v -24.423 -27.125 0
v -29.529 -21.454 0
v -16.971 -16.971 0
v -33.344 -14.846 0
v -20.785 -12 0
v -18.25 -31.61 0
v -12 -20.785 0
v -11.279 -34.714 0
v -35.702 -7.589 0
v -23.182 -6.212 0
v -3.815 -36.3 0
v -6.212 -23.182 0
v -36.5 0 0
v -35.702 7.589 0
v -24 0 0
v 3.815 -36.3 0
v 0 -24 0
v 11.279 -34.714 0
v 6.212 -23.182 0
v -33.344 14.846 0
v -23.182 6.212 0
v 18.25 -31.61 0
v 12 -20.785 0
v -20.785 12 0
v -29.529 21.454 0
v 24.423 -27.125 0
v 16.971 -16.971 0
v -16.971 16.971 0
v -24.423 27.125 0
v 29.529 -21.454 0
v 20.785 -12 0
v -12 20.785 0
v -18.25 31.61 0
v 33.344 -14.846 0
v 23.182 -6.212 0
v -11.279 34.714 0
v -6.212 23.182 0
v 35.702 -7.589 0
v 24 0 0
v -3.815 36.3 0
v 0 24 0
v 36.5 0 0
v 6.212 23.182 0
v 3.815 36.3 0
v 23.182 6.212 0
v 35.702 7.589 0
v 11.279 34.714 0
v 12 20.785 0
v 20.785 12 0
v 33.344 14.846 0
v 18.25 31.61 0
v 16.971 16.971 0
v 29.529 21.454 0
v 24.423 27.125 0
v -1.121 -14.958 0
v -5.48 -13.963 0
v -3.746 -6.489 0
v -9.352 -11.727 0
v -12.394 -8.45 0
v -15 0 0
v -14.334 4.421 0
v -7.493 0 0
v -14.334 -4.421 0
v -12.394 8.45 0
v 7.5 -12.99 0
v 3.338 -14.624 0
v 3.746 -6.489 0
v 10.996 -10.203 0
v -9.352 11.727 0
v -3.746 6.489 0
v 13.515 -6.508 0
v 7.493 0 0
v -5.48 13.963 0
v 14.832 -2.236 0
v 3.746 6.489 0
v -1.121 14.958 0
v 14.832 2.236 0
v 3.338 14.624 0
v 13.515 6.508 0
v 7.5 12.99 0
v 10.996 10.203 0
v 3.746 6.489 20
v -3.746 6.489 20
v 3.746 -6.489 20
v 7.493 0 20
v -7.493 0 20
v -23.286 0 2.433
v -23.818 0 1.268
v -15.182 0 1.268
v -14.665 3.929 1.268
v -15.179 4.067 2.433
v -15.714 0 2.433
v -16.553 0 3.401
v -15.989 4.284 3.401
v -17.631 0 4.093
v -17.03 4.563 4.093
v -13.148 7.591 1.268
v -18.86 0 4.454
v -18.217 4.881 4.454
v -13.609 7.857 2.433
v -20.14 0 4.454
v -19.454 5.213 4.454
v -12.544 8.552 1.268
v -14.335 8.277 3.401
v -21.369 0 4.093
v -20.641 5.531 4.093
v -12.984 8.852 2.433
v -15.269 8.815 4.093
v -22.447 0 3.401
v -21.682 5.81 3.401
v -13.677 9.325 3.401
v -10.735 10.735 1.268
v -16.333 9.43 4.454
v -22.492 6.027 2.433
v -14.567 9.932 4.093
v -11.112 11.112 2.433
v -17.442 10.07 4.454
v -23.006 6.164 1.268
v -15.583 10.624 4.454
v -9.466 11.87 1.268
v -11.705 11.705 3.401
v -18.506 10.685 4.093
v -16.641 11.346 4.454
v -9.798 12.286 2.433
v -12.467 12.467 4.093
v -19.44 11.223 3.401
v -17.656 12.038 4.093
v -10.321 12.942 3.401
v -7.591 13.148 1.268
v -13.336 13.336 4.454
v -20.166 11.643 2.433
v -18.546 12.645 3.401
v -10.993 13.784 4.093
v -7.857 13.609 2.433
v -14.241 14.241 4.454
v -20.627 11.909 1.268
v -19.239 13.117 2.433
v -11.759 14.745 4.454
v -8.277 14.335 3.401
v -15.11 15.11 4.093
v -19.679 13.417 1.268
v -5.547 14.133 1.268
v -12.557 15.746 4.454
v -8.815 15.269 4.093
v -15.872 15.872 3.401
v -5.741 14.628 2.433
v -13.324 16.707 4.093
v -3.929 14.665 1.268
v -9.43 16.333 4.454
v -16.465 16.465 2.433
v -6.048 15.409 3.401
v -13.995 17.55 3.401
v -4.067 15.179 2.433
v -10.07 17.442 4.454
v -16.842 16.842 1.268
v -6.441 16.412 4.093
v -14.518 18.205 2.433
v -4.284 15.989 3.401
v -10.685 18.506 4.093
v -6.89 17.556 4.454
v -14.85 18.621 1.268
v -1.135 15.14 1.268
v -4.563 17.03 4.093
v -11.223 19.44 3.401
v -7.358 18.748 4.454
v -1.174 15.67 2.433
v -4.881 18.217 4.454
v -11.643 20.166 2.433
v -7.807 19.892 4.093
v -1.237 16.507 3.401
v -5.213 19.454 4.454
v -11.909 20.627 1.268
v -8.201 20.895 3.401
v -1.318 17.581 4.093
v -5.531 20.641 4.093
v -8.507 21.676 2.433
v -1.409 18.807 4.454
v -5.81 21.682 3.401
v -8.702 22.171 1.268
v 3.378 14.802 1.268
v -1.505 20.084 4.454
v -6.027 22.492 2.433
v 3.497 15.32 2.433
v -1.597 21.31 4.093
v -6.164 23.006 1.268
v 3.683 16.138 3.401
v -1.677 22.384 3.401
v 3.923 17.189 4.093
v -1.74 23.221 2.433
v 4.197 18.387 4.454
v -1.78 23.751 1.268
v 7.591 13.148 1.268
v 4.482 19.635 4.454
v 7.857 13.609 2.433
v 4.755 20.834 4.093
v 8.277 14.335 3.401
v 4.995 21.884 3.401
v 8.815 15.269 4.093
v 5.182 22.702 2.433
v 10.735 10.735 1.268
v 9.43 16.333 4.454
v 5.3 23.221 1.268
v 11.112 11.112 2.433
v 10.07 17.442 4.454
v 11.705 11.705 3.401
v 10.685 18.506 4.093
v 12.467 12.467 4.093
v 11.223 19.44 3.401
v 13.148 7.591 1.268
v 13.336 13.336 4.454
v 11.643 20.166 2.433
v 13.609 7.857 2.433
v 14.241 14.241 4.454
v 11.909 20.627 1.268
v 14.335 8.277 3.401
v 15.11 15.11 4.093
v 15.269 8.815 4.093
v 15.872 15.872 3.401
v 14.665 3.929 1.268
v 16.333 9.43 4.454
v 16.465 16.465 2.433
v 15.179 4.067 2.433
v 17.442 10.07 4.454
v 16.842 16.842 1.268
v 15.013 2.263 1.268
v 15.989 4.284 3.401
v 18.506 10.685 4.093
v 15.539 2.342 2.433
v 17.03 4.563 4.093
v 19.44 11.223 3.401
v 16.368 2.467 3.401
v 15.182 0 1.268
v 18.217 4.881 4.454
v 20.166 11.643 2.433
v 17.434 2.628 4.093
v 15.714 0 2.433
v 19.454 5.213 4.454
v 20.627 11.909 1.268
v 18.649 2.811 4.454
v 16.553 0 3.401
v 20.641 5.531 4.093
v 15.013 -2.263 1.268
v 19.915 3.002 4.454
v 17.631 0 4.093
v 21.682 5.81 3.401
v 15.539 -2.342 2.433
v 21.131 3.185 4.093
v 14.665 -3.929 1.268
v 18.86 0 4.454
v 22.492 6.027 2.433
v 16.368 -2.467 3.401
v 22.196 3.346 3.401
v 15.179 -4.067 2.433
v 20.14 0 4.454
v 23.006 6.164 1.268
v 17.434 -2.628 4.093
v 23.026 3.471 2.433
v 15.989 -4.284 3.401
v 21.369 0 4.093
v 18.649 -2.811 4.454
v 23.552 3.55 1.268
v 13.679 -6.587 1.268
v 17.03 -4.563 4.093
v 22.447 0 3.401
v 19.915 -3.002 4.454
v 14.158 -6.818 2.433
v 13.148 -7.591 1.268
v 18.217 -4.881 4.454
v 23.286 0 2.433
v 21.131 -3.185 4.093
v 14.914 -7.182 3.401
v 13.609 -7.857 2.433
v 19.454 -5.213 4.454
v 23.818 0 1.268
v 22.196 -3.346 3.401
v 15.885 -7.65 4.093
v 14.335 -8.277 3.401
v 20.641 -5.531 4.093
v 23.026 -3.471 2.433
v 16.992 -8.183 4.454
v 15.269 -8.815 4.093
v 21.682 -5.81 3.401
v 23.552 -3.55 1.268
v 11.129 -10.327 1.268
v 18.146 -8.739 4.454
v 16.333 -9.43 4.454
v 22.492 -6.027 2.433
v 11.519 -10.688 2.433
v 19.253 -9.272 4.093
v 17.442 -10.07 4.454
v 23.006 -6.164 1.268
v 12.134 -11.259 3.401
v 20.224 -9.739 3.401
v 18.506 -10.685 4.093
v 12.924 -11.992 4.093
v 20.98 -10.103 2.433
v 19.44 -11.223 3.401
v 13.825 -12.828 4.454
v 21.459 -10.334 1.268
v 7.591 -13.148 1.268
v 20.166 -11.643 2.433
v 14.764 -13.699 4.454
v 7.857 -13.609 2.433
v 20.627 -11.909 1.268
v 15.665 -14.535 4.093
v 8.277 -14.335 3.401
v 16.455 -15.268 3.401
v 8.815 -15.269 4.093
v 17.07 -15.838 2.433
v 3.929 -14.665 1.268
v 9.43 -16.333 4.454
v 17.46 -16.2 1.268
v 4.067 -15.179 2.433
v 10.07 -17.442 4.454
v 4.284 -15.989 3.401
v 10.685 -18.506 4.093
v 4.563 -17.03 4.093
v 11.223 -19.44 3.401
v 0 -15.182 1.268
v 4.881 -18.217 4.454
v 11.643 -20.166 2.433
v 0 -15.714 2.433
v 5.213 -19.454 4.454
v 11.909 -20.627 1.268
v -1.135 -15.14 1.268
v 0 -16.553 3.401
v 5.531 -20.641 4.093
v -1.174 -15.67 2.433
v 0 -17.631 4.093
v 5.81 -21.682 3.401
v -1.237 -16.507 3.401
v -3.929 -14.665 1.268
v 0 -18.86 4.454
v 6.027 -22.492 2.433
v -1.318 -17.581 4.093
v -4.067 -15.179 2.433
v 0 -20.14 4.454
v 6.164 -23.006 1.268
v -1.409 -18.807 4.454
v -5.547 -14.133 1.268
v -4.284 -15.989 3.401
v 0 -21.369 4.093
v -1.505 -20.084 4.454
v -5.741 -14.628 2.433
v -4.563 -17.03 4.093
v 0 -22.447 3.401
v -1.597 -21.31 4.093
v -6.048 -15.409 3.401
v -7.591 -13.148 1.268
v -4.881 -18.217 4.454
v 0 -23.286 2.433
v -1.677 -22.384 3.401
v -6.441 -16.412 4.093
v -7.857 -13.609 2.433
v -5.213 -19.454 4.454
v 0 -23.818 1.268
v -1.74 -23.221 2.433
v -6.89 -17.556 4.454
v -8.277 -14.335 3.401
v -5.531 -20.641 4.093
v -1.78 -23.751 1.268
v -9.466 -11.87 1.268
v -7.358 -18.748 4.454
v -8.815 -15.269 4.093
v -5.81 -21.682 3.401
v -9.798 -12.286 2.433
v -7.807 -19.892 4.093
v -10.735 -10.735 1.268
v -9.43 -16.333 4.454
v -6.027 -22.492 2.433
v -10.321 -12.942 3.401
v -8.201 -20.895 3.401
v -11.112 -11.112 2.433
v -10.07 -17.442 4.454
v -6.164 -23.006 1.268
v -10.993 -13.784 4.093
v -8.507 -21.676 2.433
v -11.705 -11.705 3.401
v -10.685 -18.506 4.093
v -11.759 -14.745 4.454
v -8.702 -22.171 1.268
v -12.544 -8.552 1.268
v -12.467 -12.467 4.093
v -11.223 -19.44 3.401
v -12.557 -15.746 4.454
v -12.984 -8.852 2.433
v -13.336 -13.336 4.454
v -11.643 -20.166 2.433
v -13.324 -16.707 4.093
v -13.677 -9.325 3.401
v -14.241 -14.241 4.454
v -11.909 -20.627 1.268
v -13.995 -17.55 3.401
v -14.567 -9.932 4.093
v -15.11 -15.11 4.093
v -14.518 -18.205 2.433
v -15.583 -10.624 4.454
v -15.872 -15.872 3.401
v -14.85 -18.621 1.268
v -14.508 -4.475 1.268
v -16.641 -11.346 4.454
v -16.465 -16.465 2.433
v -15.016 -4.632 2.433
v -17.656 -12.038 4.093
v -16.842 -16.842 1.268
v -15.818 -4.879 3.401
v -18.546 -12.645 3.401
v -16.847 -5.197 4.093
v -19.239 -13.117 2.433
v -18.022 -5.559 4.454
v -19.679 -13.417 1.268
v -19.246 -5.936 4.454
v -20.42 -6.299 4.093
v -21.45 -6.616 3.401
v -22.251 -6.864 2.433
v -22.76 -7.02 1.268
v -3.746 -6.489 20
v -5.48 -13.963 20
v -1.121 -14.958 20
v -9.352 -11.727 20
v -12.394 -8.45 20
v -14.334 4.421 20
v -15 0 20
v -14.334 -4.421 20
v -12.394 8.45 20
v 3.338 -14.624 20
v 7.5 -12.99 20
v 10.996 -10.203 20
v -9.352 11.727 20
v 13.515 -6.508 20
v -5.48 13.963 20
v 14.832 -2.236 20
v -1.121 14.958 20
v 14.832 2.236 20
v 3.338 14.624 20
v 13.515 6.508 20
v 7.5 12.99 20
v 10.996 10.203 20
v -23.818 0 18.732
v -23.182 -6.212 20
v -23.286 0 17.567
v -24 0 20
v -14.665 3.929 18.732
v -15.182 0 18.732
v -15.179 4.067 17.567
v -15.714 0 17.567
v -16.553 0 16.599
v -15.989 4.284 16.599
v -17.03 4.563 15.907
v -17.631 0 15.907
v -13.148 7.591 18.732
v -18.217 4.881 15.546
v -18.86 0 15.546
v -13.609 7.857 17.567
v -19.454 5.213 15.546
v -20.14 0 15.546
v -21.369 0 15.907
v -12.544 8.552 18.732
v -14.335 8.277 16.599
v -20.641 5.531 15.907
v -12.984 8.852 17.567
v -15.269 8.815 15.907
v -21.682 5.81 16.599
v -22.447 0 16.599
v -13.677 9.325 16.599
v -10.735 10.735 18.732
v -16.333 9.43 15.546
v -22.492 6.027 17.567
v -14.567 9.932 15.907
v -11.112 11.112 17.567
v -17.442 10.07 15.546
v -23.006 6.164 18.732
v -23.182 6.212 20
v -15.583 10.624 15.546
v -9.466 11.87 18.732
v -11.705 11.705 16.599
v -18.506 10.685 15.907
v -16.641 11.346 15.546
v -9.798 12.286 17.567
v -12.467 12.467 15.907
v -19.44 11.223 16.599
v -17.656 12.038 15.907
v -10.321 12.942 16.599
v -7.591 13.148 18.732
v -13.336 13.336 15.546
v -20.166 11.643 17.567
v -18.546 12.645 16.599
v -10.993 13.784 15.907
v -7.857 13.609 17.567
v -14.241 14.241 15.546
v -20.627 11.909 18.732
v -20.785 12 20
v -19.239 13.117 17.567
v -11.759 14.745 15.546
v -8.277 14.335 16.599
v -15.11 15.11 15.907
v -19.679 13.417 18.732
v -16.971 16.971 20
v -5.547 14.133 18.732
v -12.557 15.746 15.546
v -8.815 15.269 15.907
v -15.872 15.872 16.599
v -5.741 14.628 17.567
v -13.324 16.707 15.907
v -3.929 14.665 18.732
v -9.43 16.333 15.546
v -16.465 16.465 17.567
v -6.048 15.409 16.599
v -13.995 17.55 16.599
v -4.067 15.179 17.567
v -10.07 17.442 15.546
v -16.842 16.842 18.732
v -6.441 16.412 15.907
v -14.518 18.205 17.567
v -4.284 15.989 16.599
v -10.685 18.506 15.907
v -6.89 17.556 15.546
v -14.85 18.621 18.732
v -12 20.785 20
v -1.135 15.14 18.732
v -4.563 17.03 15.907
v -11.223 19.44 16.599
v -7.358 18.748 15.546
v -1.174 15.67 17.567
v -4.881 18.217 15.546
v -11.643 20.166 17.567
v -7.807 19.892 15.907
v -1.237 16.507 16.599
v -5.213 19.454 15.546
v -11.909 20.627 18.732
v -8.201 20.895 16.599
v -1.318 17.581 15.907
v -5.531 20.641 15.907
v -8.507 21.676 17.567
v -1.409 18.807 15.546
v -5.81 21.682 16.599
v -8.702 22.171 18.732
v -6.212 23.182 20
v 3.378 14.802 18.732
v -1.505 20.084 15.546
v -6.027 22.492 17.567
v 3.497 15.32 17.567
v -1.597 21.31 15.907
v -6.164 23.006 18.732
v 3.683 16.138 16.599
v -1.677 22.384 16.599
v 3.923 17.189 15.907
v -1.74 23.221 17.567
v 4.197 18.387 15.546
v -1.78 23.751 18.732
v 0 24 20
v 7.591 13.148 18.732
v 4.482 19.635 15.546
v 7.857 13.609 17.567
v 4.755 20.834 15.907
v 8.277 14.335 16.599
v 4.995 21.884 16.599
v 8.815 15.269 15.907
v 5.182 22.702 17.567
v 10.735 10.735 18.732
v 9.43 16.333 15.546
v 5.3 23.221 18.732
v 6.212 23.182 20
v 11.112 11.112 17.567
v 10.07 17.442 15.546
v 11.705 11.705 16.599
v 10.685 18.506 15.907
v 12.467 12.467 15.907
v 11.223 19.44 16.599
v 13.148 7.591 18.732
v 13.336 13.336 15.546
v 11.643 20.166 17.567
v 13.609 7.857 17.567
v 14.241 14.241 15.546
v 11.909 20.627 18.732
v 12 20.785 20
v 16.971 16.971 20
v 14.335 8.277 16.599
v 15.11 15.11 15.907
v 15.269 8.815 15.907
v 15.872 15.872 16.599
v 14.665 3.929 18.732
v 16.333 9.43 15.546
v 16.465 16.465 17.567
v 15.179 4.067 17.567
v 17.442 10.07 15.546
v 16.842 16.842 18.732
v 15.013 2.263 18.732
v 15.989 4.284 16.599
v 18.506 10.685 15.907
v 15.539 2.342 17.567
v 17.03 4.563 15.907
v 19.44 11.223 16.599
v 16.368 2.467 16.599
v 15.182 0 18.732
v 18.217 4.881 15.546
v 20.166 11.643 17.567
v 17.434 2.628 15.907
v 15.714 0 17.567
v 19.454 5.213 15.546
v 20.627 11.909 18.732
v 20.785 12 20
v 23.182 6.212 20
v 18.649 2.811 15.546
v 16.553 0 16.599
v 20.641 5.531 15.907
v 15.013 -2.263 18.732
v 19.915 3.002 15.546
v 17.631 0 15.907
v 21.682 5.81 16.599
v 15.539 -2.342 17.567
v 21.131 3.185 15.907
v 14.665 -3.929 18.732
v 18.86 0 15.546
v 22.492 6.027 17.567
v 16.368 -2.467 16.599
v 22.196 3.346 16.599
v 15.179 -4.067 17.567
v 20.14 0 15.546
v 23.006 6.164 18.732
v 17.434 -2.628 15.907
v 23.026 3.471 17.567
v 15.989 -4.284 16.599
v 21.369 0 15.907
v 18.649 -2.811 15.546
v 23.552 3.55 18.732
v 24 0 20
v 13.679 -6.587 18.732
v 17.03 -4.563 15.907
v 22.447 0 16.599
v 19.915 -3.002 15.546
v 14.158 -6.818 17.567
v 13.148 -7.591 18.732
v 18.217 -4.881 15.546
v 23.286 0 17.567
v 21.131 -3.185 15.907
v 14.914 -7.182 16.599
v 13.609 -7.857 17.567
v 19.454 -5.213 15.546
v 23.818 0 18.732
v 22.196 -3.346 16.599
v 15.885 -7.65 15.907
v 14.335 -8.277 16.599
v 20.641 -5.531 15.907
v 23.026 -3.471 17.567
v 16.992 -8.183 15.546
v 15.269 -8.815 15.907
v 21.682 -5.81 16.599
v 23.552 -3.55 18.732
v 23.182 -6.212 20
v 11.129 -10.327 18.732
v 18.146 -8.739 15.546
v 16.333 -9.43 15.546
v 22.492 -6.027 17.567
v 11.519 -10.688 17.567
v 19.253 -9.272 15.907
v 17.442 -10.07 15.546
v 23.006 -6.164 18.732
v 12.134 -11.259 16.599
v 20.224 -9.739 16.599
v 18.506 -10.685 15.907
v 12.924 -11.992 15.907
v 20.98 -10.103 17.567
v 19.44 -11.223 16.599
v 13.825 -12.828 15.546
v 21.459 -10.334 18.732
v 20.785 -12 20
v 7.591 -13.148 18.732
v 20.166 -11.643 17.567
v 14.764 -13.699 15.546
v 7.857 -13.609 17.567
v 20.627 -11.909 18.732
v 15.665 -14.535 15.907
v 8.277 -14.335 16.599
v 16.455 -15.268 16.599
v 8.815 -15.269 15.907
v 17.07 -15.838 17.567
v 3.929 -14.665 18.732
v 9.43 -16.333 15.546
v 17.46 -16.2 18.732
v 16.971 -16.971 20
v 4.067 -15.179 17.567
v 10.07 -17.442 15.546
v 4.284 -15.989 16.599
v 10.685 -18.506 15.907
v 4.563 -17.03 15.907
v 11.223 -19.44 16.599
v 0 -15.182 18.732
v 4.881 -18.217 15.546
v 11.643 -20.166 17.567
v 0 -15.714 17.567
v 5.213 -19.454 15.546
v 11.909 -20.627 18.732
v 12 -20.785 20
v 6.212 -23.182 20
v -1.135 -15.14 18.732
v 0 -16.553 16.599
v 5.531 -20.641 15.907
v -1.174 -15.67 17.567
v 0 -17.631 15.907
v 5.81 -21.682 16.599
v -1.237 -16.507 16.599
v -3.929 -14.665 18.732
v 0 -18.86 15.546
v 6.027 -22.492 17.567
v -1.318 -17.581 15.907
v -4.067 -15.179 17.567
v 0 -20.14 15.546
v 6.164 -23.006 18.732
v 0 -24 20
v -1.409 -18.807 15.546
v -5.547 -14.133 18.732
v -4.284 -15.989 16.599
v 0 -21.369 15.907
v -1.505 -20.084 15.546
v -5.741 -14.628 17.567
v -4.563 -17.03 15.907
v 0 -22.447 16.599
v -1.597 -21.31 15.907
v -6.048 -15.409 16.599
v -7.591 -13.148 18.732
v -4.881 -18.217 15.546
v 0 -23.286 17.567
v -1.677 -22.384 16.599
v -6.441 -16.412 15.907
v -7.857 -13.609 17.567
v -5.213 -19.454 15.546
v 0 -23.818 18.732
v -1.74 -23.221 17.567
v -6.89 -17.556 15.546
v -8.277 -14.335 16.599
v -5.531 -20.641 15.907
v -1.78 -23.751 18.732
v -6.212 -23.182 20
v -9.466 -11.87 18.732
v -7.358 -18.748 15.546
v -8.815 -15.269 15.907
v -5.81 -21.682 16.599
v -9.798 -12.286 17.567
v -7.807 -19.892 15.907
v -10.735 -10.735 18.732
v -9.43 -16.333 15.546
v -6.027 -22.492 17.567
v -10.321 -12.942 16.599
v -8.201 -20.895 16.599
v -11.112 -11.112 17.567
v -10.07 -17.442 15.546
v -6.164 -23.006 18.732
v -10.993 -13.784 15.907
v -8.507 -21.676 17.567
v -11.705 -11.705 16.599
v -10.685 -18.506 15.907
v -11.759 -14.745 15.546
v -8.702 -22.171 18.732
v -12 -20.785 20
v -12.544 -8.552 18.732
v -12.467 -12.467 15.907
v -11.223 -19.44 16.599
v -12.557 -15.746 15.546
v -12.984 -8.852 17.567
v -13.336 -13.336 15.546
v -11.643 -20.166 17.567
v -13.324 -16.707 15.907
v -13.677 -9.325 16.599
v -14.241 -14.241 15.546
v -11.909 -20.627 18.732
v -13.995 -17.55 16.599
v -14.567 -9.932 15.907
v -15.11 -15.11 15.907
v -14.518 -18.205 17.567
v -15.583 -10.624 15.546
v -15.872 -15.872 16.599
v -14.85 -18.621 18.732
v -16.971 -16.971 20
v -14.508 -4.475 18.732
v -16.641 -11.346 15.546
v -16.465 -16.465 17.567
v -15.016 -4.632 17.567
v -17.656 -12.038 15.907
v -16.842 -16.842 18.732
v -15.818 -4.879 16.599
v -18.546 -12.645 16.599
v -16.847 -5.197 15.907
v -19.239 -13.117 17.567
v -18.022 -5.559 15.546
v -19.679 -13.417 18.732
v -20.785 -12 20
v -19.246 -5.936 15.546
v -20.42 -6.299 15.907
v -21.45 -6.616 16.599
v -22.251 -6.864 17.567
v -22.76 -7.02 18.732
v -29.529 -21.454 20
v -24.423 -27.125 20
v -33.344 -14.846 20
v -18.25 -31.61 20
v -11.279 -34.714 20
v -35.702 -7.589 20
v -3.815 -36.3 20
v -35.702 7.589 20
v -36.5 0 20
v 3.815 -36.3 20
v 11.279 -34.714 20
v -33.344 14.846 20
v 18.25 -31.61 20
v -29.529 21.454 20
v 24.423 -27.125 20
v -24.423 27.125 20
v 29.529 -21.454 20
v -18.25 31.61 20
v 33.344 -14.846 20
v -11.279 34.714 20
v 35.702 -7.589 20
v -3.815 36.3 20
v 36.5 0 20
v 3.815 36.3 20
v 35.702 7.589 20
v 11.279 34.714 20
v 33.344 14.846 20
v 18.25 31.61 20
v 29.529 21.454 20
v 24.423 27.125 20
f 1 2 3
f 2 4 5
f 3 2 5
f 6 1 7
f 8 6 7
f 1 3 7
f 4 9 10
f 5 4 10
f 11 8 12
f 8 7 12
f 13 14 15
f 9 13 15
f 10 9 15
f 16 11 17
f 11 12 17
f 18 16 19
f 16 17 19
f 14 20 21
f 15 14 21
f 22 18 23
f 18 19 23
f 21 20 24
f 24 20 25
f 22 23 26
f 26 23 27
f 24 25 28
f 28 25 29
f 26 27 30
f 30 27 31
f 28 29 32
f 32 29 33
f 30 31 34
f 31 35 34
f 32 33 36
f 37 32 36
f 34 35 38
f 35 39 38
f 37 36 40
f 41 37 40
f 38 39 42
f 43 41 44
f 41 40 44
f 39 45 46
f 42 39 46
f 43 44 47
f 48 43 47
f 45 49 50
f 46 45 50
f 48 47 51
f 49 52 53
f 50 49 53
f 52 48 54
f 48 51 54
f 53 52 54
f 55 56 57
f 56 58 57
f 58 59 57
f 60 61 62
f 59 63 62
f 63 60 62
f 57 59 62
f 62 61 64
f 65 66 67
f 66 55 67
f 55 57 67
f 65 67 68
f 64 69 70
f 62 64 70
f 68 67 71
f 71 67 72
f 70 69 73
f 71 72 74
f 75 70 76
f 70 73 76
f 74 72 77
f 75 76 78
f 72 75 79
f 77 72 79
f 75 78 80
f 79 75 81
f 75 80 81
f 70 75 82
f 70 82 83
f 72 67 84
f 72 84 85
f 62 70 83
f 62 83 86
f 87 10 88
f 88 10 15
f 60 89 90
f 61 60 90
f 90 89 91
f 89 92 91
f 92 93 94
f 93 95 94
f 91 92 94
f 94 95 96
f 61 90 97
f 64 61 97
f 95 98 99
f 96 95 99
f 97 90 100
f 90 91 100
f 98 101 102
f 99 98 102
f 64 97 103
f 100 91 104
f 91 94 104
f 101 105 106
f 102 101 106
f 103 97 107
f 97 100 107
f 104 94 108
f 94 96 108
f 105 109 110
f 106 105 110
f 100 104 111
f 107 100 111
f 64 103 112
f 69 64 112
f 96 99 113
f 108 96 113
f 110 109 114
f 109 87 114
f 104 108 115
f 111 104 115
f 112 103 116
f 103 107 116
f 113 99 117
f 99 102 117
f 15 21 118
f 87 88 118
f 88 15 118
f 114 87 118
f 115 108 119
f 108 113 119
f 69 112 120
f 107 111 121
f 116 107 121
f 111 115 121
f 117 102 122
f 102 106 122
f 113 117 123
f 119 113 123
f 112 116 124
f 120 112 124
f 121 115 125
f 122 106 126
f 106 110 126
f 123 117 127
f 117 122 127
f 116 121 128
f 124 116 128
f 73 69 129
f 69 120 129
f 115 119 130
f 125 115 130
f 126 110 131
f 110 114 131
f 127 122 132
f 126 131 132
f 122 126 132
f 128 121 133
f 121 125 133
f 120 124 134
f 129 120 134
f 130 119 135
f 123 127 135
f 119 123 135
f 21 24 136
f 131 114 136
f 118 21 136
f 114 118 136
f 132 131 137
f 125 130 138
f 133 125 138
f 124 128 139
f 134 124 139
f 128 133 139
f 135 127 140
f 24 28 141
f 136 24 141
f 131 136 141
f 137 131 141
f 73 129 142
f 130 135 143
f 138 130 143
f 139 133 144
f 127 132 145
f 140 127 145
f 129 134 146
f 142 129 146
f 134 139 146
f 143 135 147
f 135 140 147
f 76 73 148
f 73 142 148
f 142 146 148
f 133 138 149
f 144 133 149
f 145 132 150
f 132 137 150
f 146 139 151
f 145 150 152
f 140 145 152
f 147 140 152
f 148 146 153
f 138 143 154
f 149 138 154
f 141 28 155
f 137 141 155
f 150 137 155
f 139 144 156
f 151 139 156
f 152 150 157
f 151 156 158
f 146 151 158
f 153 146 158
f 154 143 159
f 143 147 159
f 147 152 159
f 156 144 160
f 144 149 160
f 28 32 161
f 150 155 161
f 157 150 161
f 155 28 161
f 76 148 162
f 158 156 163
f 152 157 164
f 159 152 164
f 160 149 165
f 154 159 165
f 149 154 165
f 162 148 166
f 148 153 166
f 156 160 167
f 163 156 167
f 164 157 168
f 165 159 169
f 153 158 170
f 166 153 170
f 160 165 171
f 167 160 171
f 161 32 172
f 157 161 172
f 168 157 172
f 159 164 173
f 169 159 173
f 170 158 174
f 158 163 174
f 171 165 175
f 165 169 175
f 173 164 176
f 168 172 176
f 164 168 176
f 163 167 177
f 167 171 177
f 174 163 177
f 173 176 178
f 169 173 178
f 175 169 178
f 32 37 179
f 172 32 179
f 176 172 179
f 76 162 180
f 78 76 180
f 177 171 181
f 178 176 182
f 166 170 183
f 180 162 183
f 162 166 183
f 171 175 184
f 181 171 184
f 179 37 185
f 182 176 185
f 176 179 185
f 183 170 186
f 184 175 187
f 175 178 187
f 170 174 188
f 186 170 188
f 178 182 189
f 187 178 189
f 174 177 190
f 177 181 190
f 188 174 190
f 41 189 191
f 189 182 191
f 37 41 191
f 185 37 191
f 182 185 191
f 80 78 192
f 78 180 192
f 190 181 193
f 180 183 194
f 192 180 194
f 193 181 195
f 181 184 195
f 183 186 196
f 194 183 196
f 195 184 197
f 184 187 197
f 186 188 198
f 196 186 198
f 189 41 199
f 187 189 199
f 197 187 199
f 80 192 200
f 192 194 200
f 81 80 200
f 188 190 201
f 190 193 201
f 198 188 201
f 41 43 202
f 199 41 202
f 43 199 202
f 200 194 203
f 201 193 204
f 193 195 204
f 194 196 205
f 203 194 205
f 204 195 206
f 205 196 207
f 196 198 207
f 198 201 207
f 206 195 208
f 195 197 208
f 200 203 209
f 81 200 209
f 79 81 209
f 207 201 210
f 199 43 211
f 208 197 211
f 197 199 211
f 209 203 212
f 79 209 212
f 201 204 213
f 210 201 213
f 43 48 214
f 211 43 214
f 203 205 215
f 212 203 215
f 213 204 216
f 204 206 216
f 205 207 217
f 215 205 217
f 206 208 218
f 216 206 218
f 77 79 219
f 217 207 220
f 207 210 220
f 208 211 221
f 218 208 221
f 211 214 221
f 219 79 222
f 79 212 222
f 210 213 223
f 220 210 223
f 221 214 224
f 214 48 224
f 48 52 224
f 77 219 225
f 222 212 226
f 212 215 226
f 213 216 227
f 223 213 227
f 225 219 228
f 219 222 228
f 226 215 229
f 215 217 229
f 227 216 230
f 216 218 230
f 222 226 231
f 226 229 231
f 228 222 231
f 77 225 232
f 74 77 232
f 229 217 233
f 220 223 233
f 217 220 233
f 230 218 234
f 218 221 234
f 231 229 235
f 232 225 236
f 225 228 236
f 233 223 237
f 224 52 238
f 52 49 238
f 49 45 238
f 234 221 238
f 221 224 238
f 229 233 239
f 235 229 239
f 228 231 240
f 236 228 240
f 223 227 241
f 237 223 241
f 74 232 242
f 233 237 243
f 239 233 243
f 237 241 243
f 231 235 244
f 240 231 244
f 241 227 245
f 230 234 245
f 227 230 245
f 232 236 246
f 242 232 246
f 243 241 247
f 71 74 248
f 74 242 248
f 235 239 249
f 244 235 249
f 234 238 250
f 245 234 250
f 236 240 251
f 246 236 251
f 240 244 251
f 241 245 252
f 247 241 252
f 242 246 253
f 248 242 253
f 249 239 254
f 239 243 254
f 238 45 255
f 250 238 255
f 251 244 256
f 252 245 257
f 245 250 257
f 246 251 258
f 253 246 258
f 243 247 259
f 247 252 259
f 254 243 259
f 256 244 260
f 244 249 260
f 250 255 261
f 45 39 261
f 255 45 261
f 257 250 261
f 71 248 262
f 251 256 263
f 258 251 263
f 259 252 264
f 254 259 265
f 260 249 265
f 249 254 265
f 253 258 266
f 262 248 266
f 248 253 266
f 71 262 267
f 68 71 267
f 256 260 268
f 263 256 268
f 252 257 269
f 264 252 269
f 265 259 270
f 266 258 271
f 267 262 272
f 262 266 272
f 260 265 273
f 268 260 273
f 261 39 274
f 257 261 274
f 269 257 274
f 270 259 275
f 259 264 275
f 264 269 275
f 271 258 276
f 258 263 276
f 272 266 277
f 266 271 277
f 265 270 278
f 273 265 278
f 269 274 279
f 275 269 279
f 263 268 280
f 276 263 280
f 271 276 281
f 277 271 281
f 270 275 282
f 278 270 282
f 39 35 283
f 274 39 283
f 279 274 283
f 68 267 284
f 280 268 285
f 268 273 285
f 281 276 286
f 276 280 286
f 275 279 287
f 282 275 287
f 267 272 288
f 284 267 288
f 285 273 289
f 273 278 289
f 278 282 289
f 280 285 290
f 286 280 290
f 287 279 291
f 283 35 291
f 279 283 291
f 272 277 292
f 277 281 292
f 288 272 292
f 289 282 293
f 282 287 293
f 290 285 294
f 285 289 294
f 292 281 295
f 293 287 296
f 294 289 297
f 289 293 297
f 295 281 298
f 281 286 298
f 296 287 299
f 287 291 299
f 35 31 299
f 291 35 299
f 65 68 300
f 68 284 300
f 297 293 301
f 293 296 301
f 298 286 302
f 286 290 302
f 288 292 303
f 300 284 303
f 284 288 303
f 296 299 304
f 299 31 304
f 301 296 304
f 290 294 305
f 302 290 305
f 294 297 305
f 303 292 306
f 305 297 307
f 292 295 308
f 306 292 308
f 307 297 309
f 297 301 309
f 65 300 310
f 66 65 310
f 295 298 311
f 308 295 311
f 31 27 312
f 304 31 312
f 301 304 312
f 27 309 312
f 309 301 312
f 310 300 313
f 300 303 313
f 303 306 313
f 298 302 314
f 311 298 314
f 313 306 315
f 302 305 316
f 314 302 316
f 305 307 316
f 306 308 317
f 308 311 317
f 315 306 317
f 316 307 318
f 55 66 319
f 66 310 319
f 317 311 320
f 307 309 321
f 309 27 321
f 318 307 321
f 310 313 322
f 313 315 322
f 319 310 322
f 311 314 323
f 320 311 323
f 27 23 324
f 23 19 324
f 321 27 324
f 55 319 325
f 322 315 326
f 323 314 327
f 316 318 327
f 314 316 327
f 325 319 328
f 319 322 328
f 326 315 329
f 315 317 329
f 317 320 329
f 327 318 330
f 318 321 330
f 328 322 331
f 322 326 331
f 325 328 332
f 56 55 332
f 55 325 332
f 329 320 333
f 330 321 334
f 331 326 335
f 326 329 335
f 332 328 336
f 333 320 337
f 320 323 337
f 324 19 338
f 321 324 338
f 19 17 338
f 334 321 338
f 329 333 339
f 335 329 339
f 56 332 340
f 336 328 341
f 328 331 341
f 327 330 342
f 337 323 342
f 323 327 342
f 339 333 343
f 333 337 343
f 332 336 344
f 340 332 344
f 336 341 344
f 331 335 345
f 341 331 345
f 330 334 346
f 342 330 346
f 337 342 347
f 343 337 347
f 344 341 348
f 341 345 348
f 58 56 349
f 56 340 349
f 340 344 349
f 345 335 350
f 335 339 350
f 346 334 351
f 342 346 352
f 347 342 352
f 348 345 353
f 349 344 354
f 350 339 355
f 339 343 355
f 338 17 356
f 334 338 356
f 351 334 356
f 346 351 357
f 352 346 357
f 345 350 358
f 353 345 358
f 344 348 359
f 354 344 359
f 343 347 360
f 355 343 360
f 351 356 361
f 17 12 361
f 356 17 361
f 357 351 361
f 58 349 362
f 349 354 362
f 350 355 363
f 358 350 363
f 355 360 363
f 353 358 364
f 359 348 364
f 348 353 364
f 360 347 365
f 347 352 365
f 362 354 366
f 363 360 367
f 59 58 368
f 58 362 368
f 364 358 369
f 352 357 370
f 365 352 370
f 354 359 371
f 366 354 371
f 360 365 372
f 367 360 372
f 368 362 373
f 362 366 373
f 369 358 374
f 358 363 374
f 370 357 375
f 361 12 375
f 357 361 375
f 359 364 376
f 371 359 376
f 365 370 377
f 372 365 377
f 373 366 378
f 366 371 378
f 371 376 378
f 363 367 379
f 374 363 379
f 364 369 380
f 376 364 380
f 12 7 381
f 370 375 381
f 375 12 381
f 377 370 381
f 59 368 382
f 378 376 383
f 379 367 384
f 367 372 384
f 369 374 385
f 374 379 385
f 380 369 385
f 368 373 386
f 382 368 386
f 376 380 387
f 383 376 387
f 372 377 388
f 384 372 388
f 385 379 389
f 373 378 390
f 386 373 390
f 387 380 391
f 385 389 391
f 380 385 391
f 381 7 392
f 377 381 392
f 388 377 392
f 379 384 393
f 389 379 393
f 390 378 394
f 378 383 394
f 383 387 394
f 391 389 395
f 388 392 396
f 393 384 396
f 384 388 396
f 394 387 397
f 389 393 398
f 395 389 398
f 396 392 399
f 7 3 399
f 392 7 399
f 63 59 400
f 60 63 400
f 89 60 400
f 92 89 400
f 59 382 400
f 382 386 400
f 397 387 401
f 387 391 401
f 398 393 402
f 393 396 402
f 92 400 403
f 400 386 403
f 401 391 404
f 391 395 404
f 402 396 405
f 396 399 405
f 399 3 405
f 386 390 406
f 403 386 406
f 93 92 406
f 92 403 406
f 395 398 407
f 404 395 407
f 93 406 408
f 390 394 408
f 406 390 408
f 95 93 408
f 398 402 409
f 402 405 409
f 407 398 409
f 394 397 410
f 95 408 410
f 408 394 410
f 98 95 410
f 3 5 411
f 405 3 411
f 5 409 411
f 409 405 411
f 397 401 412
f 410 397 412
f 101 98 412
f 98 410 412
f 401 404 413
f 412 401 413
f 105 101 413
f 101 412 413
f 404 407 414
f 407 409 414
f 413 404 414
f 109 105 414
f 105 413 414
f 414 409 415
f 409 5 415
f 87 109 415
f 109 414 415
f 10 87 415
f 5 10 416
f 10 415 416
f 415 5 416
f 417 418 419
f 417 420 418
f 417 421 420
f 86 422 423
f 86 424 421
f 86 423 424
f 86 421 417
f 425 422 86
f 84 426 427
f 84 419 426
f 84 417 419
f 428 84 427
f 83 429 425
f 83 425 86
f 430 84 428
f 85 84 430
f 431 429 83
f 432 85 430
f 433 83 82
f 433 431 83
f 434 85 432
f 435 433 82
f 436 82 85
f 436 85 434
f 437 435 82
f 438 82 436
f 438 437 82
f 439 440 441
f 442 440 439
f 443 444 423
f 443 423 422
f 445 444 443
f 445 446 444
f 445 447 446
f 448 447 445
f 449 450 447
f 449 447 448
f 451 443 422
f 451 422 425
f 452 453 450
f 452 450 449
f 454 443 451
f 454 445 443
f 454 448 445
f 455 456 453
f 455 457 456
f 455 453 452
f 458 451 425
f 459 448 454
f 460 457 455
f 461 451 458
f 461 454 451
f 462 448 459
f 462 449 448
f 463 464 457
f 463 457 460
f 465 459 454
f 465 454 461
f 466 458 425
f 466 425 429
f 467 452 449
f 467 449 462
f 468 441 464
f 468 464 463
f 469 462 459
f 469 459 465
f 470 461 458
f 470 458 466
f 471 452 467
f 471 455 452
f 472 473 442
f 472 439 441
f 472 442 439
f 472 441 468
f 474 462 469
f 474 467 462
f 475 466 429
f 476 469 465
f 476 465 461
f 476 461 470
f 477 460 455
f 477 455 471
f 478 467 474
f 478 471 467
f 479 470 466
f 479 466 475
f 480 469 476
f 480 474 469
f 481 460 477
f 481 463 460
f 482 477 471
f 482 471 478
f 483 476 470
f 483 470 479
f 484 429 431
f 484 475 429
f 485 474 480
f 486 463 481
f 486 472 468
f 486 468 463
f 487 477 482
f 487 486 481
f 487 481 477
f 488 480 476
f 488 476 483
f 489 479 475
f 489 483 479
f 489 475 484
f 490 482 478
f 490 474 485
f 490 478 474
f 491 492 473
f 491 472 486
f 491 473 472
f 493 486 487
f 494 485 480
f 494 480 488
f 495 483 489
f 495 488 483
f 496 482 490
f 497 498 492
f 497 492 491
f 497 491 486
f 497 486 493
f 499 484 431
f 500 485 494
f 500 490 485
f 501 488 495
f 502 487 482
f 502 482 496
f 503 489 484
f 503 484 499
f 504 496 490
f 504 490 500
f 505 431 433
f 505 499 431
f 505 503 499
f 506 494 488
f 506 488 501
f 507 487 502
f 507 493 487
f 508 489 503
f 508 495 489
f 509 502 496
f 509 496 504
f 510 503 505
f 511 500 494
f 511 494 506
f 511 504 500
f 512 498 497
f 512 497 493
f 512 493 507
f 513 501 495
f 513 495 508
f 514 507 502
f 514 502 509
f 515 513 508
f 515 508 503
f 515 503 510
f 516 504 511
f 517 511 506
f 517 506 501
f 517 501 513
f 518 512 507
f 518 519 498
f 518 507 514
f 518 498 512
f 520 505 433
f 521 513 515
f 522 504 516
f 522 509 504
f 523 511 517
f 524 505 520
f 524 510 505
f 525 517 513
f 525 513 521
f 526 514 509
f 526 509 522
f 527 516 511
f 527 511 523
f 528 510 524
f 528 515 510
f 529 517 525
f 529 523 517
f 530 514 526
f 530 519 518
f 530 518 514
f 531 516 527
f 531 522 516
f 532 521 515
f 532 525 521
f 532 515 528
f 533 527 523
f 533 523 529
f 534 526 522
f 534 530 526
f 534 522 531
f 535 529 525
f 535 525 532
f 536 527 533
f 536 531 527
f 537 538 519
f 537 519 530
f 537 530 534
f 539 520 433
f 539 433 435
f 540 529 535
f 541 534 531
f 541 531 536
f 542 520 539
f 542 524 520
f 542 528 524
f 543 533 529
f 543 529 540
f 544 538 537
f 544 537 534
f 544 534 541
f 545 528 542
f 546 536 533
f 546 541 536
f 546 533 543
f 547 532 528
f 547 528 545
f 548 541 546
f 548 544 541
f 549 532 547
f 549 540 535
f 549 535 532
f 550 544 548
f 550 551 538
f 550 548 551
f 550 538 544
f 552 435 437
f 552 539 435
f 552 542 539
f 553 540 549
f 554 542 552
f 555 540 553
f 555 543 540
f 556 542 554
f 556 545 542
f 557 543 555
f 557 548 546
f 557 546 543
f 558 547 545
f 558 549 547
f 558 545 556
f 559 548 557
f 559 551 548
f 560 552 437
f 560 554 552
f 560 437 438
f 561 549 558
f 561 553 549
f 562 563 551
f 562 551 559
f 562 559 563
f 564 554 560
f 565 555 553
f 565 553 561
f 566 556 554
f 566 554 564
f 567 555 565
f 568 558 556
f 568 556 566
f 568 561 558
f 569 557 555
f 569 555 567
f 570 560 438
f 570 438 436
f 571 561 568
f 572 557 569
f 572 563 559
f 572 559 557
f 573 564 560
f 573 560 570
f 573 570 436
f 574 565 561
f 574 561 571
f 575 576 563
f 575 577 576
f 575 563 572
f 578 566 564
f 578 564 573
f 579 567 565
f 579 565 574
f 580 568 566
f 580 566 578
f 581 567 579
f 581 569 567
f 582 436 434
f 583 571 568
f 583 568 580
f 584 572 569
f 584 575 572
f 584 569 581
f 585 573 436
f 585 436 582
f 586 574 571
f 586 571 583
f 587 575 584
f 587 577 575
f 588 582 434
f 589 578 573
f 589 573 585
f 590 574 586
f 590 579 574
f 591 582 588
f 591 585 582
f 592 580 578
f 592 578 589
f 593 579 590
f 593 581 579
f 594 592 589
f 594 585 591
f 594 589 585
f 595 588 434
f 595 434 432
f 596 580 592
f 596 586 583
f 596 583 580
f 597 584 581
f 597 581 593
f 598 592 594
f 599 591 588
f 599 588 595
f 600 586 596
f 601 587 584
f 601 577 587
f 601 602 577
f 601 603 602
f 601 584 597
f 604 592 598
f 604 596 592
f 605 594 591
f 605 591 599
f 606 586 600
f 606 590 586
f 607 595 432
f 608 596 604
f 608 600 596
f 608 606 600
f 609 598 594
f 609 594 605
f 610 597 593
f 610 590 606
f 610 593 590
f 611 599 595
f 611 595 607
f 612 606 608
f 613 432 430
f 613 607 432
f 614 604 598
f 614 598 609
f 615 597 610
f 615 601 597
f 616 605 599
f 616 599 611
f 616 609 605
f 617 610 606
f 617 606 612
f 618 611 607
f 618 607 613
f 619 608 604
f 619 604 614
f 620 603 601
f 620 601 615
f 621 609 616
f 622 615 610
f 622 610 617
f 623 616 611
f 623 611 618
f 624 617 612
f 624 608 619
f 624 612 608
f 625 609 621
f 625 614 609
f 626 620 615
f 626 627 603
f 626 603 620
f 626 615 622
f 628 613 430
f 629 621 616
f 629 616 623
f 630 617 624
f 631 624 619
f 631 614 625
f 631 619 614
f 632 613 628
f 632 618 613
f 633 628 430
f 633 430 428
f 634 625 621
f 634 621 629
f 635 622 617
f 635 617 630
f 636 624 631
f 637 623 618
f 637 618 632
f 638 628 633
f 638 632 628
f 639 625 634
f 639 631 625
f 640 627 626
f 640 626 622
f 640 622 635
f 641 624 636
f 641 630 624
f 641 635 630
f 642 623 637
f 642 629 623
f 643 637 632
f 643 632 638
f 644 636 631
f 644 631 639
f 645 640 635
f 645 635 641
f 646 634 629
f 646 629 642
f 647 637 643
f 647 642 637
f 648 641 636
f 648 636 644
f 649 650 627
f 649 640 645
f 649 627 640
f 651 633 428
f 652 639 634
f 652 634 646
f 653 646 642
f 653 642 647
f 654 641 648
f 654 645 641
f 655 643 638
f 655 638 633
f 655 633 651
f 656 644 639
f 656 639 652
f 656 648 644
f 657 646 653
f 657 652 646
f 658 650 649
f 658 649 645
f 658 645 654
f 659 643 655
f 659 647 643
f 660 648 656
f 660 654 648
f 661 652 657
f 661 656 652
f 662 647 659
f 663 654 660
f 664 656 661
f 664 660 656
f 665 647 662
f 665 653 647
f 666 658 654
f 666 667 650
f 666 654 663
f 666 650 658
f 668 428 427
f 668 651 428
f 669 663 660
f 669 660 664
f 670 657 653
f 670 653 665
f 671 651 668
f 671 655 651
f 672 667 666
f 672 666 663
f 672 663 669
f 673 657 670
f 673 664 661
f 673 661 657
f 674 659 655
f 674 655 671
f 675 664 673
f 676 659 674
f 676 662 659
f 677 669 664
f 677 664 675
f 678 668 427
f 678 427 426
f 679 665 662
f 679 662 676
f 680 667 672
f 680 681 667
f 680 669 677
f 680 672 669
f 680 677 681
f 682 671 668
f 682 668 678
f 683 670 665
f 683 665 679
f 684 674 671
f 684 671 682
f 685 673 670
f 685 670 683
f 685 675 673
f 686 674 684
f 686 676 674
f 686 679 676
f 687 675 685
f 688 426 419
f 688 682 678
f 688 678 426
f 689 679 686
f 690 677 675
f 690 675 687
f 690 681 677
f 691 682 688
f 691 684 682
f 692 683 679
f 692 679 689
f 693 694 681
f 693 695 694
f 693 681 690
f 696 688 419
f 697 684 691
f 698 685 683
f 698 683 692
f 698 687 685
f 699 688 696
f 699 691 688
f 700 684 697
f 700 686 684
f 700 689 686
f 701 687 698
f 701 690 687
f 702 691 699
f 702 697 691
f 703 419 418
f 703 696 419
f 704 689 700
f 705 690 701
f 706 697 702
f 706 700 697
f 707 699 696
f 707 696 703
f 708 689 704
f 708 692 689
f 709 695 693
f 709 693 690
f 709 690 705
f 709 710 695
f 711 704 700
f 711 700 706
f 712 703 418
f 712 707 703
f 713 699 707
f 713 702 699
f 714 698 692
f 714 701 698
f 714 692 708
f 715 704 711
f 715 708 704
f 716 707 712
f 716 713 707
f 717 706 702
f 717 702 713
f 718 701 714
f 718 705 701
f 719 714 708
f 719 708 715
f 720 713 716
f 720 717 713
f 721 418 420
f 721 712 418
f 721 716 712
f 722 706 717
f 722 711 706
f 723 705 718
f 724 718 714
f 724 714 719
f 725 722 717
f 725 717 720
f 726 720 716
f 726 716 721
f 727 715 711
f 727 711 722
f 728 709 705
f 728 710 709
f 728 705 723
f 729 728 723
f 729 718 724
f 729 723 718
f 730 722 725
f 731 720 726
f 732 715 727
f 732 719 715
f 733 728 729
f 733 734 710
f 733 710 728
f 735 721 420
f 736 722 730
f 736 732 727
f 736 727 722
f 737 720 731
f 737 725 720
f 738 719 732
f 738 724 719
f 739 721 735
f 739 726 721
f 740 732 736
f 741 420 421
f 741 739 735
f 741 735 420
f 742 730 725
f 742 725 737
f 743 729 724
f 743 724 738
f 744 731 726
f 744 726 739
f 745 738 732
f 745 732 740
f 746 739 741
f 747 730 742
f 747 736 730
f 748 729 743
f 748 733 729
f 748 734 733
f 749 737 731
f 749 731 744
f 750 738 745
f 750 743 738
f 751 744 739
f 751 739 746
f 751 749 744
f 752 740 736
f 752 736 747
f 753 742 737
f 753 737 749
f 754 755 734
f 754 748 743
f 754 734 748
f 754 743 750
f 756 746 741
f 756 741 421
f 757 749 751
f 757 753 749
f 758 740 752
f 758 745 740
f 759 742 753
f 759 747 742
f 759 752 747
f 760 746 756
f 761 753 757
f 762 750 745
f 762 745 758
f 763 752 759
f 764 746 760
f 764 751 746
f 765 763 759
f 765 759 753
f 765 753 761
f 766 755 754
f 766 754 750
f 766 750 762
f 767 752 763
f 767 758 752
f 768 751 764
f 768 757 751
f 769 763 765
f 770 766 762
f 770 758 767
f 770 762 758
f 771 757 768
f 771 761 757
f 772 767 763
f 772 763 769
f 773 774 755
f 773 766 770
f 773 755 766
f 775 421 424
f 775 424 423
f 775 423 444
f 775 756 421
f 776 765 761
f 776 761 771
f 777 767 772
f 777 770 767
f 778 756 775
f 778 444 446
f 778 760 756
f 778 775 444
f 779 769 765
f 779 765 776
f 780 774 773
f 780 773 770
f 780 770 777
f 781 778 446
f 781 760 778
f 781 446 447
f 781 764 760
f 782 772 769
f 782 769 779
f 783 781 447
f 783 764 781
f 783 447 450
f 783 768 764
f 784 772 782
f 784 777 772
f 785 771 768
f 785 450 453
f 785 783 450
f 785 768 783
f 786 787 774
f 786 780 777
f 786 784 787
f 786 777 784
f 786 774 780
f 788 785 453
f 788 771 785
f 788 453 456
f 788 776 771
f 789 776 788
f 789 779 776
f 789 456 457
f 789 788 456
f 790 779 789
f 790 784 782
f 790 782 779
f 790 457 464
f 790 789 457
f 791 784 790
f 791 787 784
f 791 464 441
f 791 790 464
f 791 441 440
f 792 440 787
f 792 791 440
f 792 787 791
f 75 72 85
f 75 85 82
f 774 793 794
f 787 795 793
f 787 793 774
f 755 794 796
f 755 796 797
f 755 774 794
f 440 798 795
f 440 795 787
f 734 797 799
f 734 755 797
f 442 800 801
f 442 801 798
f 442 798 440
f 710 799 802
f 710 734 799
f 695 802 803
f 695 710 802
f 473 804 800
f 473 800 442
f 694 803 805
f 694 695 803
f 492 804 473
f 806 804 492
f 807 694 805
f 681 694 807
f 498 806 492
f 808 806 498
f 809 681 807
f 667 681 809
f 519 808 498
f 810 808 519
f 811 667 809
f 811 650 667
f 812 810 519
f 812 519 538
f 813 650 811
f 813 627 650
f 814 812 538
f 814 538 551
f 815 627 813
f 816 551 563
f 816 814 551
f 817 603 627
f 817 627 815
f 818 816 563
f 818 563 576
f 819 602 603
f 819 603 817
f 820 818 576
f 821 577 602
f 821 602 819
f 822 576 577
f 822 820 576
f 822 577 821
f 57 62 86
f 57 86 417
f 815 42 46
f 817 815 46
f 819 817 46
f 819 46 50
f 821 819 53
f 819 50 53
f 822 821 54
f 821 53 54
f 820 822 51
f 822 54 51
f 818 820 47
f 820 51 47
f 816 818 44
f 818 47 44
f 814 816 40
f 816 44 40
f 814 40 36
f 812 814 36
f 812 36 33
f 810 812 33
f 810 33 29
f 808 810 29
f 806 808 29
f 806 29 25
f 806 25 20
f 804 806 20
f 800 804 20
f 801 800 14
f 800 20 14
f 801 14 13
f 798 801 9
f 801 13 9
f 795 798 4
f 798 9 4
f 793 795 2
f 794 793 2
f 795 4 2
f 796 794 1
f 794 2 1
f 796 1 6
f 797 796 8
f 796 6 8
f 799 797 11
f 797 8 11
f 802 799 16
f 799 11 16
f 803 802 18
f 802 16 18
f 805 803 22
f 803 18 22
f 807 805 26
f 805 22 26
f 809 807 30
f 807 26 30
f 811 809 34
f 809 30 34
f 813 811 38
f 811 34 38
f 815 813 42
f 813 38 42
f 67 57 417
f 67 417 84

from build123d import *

# Parameters (mm, degrees)
SKETCH1_R           = 36.5
BOSS_EXTRUDE1_DEPTH = 20


with BuildPart() as part:
    # Sketch1 → Boss-Extrude1 (new body)
    with BuildSketch(Plane.XY):
        Circle(SKETCH1_R)
        Polygon((7.493, 0), (3.7465, 6.489128351), (-3.7465, 6.489128351), (-7.493, 0), (-3.7465, -6.489128351), (3.7465, -6.489128351), align=None, mode=Mode.SUBTRACT)
    extrude(amount=BOSS_EXTRUDE1_DEPTH)

    # Cut-Sweep2: sweep along a path in Sketch3
    with BuildLine(Plane(origin=(0, 0, 0), x_dir=(-1, 0, 0), z_dir=(0, 0, -1))) as cut_sweep2_path:
        CenterArc((0, 0), 19.5, 0, 360)
    # Sketch2 → Cut-Sweep2 (sweep, cut)
    with BuildSketch(Plane(origin=(0, 0, 0), x_dir=(1, 0, 0), z_dir=(0, 1, 0))):
        with BuildLine():
            Line((-24, 0), (-15, 0))
            ThreePointArc((-15, 0), (-19.5, -4.5), (-24, 0))
        make_face()
    cut_sweep2 = sweep(path=cut_sweep2_path.line, mode=Mode.SUBTRACT)

    # Mirror1: Cut-Sweep2 across plane
    add(cut_sweep2.mirror(Plane.XY.offset(10)), mode=Mode.SUBTRACT)


solid = part.part
